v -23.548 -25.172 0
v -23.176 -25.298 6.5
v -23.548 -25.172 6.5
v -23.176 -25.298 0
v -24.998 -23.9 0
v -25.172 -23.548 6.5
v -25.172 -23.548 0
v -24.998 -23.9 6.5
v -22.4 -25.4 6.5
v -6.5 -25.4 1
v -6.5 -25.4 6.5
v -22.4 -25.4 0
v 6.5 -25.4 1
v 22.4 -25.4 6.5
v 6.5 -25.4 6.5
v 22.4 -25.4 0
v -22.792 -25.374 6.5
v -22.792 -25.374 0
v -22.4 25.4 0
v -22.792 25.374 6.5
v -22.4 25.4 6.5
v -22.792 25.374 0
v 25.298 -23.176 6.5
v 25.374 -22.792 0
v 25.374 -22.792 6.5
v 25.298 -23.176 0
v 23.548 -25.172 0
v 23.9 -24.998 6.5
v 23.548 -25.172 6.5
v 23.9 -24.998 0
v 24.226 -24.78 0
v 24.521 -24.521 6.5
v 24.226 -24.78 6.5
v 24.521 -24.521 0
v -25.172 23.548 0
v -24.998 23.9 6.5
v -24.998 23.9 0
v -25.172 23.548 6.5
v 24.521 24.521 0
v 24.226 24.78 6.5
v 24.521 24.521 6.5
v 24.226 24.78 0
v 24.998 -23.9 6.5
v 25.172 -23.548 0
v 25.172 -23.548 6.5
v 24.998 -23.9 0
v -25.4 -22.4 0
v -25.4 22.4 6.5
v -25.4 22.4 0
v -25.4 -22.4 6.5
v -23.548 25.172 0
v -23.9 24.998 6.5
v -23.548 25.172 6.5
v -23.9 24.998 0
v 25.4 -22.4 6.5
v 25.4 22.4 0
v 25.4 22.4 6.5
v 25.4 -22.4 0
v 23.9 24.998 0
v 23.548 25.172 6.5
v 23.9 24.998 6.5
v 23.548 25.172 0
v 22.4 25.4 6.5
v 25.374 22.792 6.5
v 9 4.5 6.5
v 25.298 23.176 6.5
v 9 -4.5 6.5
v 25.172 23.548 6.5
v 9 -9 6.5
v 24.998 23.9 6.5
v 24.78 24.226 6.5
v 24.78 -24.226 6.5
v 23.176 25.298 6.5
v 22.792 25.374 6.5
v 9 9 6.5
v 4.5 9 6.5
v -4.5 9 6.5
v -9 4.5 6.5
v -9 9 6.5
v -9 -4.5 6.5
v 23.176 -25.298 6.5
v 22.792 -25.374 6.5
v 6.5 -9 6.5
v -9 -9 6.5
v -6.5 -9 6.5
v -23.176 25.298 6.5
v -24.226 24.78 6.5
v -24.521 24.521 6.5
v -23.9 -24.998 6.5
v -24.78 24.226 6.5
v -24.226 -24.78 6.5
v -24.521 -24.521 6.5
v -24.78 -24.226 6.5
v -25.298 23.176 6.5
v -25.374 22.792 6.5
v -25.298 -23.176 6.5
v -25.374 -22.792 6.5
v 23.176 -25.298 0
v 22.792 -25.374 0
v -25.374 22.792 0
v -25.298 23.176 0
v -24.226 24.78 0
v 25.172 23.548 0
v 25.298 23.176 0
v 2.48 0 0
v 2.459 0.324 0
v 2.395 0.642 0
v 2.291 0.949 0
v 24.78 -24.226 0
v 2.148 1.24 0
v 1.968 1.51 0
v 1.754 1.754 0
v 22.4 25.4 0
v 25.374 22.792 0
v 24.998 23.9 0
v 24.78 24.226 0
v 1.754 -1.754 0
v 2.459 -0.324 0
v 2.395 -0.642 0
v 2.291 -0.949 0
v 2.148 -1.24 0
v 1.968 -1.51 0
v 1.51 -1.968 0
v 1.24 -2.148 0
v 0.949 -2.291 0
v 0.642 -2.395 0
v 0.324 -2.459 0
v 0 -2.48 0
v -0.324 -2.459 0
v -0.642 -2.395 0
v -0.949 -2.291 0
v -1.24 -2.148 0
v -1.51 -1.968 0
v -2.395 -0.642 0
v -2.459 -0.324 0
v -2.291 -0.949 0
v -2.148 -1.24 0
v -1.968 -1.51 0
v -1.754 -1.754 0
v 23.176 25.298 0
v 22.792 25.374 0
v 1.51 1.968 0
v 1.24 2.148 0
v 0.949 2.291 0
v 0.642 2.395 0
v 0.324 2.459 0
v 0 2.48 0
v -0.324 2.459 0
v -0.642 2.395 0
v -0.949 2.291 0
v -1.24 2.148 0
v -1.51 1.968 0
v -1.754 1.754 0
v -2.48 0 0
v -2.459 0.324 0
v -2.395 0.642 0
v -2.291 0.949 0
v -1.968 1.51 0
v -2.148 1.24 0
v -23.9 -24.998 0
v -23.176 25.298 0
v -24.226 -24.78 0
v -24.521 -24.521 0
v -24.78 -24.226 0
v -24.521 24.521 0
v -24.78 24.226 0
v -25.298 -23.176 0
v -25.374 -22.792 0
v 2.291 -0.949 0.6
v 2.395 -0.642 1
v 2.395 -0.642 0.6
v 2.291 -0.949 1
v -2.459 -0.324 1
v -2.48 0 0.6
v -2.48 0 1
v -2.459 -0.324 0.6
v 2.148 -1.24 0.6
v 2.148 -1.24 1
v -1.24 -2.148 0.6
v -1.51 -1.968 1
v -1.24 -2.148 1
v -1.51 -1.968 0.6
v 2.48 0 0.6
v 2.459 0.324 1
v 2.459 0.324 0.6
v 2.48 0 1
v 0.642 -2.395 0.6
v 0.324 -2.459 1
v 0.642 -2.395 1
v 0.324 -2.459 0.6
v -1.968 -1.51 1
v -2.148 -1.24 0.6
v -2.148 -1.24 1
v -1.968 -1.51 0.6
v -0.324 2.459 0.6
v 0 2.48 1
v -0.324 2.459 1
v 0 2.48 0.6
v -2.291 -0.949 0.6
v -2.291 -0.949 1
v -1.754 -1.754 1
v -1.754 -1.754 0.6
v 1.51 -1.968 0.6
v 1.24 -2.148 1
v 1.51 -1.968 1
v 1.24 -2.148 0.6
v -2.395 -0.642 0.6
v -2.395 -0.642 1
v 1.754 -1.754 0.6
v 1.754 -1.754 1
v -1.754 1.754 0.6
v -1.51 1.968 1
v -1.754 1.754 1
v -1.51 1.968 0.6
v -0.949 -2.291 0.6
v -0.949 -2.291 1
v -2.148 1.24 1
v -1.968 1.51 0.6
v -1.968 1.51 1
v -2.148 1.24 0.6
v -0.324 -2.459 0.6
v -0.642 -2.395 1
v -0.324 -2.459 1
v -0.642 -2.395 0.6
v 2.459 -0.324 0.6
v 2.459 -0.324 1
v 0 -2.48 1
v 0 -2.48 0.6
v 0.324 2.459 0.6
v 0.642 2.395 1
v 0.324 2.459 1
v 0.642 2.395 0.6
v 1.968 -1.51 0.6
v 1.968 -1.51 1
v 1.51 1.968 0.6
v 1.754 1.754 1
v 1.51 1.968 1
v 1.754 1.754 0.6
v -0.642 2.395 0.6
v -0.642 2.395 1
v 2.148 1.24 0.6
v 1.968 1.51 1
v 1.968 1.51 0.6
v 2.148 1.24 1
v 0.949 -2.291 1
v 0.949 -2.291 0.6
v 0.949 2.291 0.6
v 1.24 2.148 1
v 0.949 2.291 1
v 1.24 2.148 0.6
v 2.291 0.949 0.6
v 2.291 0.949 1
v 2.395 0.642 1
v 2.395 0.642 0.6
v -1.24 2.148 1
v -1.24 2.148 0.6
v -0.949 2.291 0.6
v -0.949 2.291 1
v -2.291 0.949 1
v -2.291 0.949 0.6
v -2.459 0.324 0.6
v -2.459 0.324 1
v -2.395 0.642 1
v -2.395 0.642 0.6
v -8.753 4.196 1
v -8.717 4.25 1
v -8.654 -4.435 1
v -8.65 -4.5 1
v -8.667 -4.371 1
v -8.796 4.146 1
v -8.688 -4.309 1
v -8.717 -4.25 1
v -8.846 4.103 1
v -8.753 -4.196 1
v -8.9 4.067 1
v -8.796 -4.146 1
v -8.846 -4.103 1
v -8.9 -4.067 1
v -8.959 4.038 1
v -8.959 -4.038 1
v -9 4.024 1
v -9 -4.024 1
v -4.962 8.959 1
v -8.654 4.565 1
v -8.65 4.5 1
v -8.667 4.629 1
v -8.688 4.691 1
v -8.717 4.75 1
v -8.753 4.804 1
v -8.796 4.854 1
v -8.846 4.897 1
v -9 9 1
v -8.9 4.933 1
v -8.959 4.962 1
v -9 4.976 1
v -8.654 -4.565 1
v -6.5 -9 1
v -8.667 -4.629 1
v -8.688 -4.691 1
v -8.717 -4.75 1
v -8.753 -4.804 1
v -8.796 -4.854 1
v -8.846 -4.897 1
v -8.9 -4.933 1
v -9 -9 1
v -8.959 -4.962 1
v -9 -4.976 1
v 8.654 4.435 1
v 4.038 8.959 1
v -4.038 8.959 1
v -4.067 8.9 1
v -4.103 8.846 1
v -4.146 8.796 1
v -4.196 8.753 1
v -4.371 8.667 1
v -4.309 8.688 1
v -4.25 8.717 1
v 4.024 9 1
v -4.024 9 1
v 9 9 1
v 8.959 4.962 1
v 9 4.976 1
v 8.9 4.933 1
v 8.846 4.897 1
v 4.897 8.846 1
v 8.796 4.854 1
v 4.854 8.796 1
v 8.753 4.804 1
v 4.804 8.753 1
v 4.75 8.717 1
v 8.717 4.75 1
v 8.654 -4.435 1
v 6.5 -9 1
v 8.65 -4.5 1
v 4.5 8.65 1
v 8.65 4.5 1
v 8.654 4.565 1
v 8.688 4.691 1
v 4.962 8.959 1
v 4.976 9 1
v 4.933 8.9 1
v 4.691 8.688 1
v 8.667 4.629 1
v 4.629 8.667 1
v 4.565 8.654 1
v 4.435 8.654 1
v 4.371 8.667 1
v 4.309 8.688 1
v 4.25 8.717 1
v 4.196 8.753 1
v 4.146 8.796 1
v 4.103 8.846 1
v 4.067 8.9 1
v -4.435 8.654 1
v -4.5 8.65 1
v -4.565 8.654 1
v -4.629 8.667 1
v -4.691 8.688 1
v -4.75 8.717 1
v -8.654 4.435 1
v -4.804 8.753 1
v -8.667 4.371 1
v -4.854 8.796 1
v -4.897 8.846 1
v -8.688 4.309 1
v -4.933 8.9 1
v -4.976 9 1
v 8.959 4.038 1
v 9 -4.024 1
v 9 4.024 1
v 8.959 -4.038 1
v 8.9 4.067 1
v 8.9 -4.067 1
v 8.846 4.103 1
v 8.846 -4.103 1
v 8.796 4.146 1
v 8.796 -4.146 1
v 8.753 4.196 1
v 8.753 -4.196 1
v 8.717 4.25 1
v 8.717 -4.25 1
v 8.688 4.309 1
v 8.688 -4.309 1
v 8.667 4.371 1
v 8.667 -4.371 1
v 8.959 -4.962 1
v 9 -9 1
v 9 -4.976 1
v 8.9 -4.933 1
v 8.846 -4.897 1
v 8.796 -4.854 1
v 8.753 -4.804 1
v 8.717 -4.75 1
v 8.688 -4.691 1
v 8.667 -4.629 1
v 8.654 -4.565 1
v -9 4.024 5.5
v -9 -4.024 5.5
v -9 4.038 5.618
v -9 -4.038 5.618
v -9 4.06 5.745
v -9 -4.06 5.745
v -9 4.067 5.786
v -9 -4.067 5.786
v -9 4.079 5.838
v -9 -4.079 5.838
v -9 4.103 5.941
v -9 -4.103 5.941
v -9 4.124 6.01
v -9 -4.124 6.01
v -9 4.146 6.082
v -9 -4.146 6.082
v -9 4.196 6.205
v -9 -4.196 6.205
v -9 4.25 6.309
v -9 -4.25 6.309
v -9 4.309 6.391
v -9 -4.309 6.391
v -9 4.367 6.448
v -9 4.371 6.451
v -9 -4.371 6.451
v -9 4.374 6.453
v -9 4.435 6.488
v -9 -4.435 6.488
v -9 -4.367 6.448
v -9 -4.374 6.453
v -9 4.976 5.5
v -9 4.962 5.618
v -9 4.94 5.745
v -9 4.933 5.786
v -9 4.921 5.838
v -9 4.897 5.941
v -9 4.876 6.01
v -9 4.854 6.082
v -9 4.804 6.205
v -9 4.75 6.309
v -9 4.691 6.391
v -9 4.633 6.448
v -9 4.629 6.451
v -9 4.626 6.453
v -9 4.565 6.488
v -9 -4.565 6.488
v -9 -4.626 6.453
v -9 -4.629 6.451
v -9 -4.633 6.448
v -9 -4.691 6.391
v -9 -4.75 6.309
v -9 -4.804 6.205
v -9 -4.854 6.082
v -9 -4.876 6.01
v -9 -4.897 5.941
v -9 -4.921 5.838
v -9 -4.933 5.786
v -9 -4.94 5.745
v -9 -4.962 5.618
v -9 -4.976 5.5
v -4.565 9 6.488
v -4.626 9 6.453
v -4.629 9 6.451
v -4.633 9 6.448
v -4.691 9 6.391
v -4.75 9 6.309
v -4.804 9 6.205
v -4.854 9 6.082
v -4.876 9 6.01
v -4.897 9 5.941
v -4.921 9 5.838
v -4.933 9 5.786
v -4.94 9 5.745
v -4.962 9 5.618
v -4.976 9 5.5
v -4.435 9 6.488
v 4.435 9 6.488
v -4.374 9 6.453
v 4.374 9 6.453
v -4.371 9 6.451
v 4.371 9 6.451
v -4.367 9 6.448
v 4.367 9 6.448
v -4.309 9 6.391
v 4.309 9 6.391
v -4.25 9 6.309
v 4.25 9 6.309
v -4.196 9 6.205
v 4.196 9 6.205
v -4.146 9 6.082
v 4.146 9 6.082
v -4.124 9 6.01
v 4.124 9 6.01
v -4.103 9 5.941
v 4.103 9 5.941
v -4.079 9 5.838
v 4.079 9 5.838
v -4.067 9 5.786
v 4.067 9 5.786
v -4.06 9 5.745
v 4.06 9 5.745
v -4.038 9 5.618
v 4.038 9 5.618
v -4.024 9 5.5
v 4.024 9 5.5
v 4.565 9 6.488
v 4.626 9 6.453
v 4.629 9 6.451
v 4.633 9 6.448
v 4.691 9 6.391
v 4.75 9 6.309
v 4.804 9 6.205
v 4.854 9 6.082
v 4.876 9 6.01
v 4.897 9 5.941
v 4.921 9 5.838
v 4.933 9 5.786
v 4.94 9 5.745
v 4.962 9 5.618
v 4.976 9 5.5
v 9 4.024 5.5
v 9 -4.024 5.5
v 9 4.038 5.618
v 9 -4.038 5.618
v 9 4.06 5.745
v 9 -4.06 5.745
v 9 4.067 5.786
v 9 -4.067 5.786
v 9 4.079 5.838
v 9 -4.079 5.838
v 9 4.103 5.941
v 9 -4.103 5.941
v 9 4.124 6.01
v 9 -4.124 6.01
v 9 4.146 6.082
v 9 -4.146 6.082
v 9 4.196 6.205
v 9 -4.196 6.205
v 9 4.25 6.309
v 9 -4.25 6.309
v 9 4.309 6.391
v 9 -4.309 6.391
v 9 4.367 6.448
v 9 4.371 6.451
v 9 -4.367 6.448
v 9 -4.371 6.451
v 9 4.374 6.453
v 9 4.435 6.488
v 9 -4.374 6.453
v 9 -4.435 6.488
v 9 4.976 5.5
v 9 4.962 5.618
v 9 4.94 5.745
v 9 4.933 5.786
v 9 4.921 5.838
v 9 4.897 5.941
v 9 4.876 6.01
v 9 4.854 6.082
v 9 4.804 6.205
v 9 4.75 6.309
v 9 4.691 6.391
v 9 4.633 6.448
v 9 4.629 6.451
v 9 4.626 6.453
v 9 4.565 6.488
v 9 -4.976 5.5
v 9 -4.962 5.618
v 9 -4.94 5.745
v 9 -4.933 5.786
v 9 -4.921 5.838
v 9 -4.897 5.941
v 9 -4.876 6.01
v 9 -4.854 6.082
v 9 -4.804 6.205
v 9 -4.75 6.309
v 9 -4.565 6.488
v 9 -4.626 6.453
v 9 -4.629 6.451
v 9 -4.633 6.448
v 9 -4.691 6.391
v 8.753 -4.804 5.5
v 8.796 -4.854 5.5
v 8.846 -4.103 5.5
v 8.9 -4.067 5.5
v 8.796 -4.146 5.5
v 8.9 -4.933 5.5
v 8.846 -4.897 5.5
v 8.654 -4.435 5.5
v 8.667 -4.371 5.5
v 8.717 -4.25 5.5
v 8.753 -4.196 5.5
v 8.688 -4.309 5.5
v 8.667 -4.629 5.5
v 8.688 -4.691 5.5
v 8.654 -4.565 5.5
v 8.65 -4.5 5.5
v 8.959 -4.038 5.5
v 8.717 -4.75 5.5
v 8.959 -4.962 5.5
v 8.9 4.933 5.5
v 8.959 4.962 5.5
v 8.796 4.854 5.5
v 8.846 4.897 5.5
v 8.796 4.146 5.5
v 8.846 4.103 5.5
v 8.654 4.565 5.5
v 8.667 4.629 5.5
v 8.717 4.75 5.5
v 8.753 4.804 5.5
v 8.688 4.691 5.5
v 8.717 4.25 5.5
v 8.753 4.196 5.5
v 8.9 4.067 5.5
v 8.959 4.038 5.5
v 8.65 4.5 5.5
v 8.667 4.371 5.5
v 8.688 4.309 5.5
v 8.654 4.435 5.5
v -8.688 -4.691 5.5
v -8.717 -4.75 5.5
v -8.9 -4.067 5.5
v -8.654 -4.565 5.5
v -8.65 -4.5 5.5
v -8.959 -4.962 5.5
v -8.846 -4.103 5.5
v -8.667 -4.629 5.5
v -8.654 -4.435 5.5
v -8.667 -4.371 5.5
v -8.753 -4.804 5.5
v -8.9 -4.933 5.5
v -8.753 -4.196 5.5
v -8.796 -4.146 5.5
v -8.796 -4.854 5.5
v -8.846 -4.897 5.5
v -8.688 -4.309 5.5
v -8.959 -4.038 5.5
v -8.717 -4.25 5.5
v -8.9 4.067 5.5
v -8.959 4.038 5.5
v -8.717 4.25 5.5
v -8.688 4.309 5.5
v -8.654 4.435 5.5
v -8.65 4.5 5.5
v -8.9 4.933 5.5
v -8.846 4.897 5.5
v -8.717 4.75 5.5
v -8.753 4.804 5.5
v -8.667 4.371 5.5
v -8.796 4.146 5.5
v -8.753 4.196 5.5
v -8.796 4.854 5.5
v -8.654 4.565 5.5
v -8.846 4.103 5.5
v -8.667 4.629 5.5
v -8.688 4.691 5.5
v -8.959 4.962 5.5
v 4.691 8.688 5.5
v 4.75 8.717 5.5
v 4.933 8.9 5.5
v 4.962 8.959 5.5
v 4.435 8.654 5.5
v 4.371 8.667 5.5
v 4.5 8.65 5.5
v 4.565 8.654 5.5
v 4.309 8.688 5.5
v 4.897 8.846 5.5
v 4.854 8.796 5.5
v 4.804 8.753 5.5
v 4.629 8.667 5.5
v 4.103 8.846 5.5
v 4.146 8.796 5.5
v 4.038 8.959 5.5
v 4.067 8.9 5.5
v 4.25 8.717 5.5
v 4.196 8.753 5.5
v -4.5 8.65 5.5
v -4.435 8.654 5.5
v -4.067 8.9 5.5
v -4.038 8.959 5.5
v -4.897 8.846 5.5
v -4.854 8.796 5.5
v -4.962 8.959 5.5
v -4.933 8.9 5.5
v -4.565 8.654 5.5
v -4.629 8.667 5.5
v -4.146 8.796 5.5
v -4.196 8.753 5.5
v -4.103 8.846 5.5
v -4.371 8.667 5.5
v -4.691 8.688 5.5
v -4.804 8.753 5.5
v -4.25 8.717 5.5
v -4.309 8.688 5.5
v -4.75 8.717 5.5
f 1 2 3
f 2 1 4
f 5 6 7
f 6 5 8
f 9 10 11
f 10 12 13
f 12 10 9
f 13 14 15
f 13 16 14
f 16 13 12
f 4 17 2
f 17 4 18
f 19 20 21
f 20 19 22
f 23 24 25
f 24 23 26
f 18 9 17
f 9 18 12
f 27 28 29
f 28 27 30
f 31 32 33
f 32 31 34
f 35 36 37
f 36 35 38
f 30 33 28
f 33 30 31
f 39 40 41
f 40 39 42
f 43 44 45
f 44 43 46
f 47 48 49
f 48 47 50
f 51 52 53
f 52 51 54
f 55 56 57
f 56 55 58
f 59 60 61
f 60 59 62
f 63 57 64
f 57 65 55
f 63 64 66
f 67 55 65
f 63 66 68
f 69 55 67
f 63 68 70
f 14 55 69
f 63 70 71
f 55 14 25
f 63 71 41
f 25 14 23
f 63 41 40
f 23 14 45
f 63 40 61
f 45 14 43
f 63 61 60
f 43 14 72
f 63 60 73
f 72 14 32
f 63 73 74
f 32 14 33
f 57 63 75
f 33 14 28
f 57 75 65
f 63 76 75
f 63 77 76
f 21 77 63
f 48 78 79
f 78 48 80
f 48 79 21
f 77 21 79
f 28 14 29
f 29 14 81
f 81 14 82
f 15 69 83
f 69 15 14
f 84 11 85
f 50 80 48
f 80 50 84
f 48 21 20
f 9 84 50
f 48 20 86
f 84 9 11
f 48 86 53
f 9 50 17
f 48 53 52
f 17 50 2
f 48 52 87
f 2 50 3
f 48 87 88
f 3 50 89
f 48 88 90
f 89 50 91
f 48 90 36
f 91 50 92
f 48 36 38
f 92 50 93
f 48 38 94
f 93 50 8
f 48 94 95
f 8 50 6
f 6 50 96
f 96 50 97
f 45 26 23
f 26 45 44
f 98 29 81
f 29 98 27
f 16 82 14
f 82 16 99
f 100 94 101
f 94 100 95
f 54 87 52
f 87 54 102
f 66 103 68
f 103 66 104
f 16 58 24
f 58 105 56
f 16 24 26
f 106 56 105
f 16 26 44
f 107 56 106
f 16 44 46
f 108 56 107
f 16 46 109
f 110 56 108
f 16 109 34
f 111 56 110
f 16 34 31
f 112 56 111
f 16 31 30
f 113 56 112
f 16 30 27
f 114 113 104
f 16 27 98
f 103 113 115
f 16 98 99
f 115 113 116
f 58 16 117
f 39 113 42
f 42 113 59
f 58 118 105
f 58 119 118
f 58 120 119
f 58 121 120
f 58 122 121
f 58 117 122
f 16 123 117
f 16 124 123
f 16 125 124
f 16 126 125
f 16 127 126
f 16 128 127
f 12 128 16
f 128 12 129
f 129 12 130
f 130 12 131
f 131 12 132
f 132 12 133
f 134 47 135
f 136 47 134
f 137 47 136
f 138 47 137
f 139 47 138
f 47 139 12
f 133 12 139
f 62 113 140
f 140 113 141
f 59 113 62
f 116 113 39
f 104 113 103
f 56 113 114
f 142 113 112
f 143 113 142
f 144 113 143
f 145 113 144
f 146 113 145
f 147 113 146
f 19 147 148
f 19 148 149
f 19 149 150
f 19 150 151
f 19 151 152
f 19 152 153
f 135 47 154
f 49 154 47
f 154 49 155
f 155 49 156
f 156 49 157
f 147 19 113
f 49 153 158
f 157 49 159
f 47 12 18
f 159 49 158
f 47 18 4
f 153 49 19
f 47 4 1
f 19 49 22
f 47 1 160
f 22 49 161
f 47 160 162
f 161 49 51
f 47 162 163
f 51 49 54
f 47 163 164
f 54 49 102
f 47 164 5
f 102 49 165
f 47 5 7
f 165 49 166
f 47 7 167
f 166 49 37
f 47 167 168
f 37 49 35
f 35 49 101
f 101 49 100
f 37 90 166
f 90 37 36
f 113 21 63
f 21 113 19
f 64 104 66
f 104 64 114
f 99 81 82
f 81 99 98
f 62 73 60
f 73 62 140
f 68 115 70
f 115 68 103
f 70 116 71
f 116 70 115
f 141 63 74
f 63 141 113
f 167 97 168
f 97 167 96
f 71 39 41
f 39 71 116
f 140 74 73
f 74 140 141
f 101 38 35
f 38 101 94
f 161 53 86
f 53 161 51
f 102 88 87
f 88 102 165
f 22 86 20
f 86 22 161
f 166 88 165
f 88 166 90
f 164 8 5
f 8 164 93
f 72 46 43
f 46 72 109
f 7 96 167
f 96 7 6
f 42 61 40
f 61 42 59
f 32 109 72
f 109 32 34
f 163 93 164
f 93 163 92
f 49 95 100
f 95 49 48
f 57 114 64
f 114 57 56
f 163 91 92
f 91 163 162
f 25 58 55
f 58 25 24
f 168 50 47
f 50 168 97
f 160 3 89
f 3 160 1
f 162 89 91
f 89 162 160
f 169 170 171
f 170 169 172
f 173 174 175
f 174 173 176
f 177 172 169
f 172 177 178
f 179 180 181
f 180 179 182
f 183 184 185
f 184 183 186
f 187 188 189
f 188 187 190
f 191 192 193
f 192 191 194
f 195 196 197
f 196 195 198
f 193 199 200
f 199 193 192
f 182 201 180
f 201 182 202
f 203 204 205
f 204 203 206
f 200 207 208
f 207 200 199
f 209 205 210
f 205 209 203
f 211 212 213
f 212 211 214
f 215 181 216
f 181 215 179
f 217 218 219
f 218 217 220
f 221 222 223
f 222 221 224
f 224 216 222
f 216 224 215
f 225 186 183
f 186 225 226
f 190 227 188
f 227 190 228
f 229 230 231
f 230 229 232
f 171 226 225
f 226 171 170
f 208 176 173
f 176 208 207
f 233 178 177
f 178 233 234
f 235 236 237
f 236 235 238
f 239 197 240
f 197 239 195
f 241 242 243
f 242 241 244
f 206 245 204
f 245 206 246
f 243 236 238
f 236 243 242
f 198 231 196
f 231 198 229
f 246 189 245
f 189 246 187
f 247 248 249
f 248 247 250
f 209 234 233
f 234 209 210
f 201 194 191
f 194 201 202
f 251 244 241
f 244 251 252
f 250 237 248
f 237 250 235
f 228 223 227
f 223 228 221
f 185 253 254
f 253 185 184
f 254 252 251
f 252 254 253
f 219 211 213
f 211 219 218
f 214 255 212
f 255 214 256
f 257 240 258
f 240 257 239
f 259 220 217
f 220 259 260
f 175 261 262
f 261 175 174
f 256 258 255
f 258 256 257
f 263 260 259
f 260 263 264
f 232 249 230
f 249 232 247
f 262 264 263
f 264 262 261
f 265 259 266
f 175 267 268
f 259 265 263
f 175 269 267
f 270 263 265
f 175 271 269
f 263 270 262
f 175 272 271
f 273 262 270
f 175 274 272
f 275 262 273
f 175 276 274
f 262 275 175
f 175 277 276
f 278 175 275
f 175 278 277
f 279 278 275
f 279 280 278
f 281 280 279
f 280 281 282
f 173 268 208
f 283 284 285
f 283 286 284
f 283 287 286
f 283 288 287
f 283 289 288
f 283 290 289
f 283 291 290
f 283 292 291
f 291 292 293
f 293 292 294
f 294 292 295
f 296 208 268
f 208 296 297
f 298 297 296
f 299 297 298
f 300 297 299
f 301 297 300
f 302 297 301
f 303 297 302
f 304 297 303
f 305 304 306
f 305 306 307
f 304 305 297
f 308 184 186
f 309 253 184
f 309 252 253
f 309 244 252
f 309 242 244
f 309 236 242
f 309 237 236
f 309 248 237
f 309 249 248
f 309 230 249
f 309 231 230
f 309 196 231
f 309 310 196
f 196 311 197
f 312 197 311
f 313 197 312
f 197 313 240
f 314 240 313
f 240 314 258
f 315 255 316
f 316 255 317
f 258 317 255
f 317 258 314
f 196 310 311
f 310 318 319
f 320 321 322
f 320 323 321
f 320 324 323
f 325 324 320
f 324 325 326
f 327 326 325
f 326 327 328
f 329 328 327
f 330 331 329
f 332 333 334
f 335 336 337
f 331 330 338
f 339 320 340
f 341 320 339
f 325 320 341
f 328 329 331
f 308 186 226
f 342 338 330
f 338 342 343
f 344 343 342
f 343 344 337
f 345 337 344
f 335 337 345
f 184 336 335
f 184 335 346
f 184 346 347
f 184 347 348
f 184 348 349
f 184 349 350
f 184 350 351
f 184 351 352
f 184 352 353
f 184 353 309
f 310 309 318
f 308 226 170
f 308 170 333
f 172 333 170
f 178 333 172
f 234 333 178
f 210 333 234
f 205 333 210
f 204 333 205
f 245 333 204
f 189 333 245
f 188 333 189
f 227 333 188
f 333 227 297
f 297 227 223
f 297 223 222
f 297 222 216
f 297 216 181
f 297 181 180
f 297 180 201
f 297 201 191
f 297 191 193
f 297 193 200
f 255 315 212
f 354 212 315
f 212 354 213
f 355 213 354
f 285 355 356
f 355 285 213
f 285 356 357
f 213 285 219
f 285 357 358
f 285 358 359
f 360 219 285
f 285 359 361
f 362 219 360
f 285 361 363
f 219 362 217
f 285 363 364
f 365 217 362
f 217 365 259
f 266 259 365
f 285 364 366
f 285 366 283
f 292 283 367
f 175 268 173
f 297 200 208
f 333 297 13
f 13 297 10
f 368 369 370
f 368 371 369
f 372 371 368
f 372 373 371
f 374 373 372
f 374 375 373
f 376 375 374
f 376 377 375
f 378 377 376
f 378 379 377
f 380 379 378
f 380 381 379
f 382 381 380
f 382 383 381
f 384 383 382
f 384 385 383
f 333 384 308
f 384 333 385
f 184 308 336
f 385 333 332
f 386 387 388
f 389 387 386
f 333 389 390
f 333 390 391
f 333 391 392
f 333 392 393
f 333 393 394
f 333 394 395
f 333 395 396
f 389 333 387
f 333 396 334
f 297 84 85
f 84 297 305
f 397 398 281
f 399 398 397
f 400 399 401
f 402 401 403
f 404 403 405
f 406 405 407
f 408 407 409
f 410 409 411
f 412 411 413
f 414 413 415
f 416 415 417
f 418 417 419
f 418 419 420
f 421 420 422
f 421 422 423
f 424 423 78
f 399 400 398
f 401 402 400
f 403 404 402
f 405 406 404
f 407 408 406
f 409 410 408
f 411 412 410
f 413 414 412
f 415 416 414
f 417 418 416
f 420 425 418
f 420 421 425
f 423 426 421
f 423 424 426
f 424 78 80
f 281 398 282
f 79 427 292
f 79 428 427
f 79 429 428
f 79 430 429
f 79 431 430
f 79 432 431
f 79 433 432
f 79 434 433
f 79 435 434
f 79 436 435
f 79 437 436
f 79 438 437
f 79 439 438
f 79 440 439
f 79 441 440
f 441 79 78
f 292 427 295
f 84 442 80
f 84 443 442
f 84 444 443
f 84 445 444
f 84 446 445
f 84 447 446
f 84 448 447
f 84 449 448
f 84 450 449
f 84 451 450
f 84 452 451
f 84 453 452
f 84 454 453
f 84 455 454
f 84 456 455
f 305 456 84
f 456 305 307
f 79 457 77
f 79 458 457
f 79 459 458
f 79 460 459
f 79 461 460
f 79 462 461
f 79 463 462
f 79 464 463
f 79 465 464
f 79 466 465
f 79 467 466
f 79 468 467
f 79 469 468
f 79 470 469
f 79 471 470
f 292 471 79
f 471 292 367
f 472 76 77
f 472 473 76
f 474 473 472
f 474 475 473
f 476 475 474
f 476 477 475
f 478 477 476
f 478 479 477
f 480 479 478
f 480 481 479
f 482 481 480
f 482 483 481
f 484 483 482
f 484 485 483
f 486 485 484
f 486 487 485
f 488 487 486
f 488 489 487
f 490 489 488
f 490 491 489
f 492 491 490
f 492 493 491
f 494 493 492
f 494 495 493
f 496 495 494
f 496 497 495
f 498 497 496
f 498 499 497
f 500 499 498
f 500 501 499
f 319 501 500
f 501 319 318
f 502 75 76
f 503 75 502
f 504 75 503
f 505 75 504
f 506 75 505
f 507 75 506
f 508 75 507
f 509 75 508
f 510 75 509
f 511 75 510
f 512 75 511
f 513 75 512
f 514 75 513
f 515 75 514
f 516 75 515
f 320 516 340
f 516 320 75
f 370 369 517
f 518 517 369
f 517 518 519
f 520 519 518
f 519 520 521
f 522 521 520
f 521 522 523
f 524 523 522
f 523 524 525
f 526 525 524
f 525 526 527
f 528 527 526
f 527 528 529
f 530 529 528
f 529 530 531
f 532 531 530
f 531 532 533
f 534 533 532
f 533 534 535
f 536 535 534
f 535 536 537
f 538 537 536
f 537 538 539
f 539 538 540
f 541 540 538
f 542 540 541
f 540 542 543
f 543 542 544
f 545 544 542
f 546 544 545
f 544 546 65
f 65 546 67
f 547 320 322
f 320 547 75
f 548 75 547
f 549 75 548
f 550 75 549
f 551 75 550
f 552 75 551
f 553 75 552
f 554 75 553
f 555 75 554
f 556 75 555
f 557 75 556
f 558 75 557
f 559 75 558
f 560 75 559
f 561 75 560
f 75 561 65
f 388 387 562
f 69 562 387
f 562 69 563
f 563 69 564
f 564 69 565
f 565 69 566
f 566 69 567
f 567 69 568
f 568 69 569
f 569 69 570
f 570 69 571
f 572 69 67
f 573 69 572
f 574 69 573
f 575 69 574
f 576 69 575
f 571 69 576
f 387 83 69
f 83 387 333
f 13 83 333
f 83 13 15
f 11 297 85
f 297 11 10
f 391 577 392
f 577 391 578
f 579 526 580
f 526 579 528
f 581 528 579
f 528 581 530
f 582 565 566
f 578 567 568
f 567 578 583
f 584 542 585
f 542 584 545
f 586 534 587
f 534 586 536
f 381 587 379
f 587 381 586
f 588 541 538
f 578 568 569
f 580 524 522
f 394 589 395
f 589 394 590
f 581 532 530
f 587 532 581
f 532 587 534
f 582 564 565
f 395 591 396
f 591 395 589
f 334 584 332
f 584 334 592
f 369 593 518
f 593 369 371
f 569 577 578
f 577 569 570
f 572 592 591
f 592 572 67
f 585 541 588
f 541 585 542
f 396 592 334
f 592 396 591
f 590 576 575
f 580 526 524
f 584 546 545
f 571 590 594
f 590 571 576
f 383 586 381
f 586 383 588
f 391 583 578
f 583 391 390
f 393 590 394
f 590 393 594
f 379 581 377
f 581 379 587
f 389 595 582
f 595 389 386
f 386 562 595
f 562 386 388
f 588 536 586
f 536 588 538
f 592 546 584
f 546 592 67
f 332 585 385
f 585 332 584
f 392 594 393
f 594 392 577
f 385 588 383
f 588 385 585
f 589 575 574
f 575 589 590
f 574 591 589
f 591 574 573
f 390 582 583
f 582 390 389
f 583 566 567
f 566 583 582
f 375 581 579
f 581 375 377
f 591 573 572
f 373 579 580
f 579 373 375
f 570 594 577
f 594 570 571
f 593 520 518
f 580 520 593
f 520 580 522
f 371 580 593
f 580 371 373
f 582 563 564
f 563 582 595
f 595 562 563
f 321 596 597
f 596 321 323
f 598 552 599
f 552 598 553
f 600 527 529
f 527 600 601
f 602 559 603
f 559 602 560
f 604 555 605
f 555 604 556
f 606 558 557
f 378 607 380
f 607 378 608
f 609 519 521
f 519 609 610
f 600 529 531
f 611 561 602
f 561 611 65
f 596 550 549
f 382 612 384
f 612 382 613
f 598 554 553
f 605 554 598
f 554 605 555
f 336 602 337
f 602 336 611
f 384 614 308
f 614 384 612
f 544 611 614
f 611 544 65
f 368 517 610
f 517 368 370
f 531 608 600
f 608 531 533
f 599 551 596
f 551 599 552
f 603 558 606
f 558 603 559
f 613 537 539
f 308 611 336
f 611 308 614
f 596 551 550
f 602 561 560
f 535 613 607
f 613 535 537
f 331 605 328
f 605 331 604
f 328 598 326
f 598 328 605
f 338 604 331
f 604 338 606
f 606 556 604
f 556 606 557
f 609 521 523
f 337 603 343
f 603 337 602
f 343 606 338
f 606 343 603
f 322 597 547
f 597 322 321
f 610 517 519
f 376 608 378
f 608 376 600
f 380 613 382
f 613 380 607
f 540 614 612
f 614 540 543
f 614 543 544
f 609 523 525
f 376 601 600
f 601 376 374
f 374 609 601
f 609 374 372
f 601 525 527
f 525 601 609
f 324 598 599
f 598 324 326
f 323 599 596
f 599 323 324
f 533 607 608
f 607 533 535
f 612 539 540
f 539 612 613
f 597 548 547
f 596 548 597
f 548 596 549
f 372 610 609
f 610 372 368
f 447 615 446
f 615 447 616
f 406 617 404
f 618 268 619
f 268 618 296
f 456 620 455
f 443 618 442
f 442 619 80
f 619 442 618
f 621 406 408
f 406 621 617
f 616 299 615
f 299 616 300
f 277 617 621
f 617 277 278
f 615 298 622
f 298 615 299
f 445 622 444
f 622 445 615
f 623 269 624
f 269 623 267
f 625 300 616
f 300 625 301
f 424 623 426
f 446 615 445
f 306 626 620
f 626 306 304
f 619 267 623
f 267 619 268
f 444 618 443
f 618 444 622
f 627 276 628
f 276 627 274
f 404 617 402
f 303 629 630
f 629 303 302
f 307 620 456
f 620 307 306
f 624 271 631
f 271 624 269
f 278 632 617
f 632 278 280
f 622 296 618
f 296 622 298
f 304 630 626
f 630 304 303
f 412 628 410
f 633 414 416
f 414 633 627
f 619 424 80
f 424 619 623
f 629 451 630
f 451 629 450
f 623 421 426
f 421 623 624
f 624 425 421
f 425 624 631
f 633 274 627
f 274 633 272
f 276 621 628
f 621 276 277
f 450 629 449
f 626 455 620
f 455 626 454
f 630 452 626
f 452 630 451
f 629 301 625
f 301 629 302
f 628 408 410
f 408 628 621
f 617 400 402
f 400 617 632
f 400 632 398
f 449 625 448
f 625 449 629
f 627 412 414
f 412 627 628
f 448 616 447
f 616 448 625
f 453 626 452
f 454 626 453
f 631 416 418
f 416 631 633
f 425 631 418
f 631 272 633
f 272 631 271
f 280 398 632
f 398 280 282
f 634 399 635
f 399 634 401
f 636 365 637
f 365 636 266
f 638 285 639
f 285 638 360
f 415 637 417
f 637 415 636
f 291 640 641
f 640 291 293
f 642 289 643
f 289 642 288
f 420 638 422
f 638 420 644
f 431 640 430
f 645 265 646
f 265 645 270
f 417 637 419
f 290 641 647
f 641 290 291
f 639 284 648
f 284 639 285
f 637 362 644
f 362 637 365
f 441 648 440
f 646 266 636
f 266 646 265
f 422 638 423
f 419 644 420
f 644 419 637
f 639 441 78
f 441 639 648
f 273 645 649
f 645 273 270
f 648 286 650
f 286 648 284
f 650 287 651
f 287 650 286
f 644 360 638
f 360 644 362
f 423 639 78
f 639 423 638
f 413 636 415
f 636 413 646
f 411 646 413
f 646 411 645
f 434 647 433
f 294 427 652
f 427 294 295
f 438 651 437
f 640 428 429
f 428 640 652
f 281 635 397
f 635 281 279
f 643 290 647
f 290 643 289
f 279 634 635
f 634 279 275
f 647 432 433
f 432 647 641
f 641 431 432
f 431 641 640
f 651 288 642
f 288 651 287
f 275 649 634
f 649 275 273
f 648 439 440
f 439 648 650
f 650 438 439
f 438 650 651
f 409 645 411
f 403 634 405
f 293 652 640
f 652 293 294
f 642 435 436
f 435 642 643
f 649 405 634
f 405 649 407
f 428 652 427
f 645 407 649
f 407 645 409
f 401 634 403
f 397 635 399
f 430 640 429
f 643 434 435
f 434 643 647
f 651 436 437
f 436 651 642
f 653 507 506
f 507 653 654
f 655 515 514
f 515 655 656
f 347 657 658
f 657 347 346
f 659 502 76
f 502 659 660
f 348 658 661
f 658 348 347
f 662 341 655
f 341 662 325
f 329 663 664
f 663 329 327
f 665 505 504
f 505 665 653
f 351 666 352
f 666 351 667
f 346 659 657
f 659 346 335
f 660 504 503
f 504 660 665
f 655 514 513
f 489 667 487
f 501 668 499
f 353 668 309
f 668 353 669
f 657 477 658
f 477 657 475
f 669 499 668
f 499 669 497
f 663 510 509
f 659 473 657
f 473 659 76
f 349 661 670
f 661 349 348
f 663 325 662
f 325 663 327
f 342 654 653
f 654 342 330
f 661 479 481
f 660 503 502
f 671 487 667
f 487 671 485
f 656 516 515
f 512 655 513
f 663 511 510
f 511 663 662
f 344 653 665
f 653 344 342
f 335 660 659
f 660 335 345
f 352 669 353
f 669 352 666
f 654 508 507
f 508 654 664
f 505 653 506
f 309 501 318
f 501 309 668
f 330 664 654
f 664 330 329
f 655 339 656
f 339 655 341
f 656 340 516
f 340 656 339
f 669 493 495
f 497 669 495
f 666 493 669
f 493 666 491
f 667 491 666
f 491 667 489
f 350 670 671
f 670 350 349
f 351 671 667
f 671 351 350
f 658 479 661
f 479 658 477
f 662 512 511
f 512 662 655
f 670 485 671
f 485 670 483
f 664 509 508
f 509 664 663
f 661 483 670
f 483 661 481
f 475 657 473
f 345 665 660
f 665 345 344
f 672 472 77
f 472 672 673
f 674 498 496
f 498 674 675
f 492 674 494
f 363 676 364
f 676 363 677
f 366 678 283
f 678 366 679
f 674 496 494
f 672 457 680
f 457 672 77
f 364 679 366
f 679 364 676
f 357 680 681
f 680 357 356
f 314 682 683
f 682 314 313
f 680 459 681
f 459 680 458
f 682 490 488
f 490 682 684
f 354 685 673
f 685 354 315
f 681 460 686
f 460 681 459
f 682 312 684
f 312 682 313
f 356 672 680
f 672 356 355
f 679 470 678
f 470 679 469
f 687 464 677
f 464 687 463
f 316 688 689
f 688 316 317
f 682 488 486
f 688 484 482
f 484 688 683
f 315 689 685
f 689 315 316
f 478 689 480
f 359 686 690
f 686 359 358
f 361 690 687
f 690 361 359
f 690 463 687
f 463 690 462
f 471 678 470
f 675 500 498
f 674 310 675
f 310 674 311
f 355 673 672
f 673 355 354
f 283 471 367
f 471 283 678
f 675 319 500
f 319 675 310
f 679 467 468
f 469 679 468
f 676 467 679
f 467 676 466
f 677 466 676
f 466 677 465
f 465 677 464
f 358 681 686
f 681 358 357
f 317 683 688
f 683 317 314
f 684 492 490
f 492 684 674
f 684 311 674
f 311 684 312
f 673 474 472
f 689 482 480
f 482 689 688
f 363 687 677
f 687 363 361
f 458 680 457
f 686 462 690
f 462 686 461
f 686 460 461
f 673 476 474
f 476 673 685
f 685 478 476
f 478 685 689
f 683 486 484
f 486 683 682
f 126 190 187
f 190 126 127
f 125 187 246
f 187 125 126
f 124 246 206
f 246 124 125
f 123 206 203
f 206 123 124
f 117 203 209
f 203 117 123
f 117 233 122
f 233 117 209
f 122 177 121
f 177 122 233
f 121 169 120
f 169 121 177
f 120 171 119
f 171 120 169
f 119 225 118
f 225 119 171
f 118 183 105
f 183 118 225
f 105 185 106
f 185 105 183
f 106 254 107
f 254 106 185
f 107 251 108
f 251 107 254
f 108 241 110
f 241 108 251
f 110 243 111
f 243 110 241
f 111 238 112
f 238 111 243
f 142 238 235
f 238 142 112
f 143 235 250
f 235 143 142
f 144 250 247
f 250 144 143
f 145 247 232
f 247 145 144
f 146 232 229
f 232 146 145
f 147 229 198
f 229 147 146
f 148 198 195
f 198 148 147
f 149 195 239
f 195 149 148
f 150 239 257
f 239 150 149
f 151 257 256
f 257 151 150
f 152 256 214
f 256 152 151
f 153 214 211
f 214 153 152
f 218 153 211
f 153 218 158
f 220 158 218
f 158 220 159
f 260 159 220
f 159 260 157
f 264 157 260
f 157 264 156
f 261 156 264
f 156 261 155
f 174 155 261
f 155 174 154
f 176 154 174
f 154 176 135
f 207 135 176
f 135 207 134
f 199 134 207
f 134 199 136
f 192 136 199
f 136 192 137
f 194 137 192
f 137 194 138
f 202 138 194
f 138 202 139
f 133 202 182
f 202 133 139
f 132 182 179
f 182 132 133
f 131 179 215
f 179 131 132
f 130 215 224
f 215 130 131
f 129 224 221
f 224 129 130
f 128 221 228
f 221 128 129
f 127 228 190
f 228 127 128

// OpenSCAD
// SW13 test panel: one one-light Touch Toggle in a 2 x 2 in plate.
//
// Tests fit, crush-rib retention and touch through a 1.0 mm skin before the
// next station map. Toggle sizes are the caliper measurements in README.md.
//
// Prints face down with no supports: skin on the bed, pocket open at the back.
//   z 0 .. ink_t          face; track and SW13 recessed here
//   0 .. skin_t           skin over the toggle, LED hole only
//   skin_t .. total_t     pocket, crush ribs, wire slot out the bottom edge
//
// Face: a horizontal main through the switch, with a spur diverging north-west
// at 45 degrees from the junction and then running west. A ring round the LED marks the switch, as on Barn.
//
// One colour: print part="body" alone (track and SW13 stay recessed).
// Two colour: load body + ink as one object; the ink fills the recess.
//   ./docs/benchwork/station_maps_3d/build.sh

part = "all";  // all (colour preview) | body | ink

/* [Plate] */
plate_w = 50.8;        // 2 in
plate_r = 3.0;         // corner radius
skin_t = 1.0;
back_gap = 0.4;        // toggle sits this far below the back, so tape lies flat

/* [One-light toggle, measured] */
toggle_w = 17.7;
toggle_t = 5.1;
led_d = 4.76;          // 3/16 in, from the spec drawing, centred

/* [Fit] */
pocket_clearance = 0.3;  // total, each axis
led_clearance = 0.2;
rib_d = 1.0;
rib_protrude = 0.35;     // into the pocket; 0.2 mm interference a side
lead_in = 1.0;           // rib taper at the back so the toggle starts easily
wire_slot_w = 13.0;      // ribbon is 3.8 wide but its position varies

/* [Face] */
ink_t = 0.6;
track_w = 1.3;
ring_w = 1.3;
edge_inset = 3.0;        // track ends this far inside the plate edge
pocket_x = 0;            // LED at the plate centre
pocket_y = 0;
spur_y = 13;             // where the 45 degree spur turns west
label = "SW13";
letter_size = 5;
label_pos = [12.6, 16];

$fn = 48;

total_t = skin_t + toggle_t + back_gap;
pocket_w = toggle_w + pocket_clearance;
pocket_depth = total_t - skin_t;

module plate2d() {
  offset(r = plate_r) square(plate_w - 2 * plate_r, center = true);
}

module label2d() {
  translate(label_pos)
    text(label, size = letter_size, font = "Arial Black", halign = "center", valign = "center");
}

SWITCH = [pocket_x, pocket_y];
EDGE = plate_w / 2 - edge_inset;

module led2d() {
  translate(SWITCH) circle(d = led_d + led_clearance);
}

module line2(a, b) {
  hull() {
    translate(a) circle(d = track_w);
    translate(b) circle(d = track_w);
  }
}

module ink2d() {
  difference() {
    union() {
      line2([-EDGE, pocket_y], [EDGE, pocket_y]);       // main
      bend = [pocket_x - (spur_y - pocket_y), spur_y];  // 45 degrees
      line2(SWITCH, bend);                              // spur north-west
      line2(bend, [-EDGE, spur_y]);                     // then west
      translate(SWITCH) circle(d = led_d + led_clearance + 2 * ring_w);
      label2d();
    }
    led2d();
  }
}

// Pocket plus a slot from its bottom wall out through the plate's bottom edge.
module pocket2d() {
  translate(SWITCH) square(pocket_w, center = true);
  translate([pocket_x - wire_slot_w / 2, -plate_w]) square([wire_slot_w, plate_w + pocket_y]);
}

// Two ribs on each of the left, right and top walls; the bottom wall is the slot.
RIB_OFFSET = pocket_w / 4;
RIBS = [
  for (s = [-1, 1]) [[pocket_x - pocket_w / 2, pocket_y + s * RIB_OFFSET], [1, 0]],
  for (s = [-1, 1]) [[pocket_x + pocket_w / 2, pocket_y + s * RIB_OFFSET], [-1, 0]],
  for (s = [-1, 1]) [[pocket_x + s * RIB_OFFSET, pocket_y + pocket_w / 2], [0, -1]],
];

module rib(p, n) {
  // Cylinder centred so it stands rib_protrude proud of the wall.
  c = p + n * (rib_protrude - rib_d / 2);
  translate([c[0], c[1], skin_t]) hull() {
    cylinder(d = rib_d, h = pocket_depth - lead_in);
    translate(-n * rib_protrude) cylinder(d = rib_d, h = pocket_depth);
  }
}

module body() {
  difference() {
    linear_extrude(total_t) plate2d();
    translate([0, 0, -1]) linear_extrude(ink_t + 1) ink2d();
    translate([0, 0, -1]) linear_extrude(total_t + 2) led2d();
    translate([0, 0, skin_t]) linear_extrude(pocket_depth + 1) pocket2d();
  }
  // Clip ribs to the plate so none pokes out through the wire slot.
  intersection() {
    union() for (r = RIBS) rib(r[0], r[1]);
    linear_extrude(total_t) plate2d();
  }
}

module ink() {
  linear_extrude(ink_t) ink2d();
}

// Turn the face onto the bed so the label reads correctly once picked up.
mirror([1, 0, 0]) {
  if (part == "body") body();
  else if (part == "ink") ink();
  else {
    color("white") body();
    color([0.08, 0.08, 0.08]) ink();
  }
}
